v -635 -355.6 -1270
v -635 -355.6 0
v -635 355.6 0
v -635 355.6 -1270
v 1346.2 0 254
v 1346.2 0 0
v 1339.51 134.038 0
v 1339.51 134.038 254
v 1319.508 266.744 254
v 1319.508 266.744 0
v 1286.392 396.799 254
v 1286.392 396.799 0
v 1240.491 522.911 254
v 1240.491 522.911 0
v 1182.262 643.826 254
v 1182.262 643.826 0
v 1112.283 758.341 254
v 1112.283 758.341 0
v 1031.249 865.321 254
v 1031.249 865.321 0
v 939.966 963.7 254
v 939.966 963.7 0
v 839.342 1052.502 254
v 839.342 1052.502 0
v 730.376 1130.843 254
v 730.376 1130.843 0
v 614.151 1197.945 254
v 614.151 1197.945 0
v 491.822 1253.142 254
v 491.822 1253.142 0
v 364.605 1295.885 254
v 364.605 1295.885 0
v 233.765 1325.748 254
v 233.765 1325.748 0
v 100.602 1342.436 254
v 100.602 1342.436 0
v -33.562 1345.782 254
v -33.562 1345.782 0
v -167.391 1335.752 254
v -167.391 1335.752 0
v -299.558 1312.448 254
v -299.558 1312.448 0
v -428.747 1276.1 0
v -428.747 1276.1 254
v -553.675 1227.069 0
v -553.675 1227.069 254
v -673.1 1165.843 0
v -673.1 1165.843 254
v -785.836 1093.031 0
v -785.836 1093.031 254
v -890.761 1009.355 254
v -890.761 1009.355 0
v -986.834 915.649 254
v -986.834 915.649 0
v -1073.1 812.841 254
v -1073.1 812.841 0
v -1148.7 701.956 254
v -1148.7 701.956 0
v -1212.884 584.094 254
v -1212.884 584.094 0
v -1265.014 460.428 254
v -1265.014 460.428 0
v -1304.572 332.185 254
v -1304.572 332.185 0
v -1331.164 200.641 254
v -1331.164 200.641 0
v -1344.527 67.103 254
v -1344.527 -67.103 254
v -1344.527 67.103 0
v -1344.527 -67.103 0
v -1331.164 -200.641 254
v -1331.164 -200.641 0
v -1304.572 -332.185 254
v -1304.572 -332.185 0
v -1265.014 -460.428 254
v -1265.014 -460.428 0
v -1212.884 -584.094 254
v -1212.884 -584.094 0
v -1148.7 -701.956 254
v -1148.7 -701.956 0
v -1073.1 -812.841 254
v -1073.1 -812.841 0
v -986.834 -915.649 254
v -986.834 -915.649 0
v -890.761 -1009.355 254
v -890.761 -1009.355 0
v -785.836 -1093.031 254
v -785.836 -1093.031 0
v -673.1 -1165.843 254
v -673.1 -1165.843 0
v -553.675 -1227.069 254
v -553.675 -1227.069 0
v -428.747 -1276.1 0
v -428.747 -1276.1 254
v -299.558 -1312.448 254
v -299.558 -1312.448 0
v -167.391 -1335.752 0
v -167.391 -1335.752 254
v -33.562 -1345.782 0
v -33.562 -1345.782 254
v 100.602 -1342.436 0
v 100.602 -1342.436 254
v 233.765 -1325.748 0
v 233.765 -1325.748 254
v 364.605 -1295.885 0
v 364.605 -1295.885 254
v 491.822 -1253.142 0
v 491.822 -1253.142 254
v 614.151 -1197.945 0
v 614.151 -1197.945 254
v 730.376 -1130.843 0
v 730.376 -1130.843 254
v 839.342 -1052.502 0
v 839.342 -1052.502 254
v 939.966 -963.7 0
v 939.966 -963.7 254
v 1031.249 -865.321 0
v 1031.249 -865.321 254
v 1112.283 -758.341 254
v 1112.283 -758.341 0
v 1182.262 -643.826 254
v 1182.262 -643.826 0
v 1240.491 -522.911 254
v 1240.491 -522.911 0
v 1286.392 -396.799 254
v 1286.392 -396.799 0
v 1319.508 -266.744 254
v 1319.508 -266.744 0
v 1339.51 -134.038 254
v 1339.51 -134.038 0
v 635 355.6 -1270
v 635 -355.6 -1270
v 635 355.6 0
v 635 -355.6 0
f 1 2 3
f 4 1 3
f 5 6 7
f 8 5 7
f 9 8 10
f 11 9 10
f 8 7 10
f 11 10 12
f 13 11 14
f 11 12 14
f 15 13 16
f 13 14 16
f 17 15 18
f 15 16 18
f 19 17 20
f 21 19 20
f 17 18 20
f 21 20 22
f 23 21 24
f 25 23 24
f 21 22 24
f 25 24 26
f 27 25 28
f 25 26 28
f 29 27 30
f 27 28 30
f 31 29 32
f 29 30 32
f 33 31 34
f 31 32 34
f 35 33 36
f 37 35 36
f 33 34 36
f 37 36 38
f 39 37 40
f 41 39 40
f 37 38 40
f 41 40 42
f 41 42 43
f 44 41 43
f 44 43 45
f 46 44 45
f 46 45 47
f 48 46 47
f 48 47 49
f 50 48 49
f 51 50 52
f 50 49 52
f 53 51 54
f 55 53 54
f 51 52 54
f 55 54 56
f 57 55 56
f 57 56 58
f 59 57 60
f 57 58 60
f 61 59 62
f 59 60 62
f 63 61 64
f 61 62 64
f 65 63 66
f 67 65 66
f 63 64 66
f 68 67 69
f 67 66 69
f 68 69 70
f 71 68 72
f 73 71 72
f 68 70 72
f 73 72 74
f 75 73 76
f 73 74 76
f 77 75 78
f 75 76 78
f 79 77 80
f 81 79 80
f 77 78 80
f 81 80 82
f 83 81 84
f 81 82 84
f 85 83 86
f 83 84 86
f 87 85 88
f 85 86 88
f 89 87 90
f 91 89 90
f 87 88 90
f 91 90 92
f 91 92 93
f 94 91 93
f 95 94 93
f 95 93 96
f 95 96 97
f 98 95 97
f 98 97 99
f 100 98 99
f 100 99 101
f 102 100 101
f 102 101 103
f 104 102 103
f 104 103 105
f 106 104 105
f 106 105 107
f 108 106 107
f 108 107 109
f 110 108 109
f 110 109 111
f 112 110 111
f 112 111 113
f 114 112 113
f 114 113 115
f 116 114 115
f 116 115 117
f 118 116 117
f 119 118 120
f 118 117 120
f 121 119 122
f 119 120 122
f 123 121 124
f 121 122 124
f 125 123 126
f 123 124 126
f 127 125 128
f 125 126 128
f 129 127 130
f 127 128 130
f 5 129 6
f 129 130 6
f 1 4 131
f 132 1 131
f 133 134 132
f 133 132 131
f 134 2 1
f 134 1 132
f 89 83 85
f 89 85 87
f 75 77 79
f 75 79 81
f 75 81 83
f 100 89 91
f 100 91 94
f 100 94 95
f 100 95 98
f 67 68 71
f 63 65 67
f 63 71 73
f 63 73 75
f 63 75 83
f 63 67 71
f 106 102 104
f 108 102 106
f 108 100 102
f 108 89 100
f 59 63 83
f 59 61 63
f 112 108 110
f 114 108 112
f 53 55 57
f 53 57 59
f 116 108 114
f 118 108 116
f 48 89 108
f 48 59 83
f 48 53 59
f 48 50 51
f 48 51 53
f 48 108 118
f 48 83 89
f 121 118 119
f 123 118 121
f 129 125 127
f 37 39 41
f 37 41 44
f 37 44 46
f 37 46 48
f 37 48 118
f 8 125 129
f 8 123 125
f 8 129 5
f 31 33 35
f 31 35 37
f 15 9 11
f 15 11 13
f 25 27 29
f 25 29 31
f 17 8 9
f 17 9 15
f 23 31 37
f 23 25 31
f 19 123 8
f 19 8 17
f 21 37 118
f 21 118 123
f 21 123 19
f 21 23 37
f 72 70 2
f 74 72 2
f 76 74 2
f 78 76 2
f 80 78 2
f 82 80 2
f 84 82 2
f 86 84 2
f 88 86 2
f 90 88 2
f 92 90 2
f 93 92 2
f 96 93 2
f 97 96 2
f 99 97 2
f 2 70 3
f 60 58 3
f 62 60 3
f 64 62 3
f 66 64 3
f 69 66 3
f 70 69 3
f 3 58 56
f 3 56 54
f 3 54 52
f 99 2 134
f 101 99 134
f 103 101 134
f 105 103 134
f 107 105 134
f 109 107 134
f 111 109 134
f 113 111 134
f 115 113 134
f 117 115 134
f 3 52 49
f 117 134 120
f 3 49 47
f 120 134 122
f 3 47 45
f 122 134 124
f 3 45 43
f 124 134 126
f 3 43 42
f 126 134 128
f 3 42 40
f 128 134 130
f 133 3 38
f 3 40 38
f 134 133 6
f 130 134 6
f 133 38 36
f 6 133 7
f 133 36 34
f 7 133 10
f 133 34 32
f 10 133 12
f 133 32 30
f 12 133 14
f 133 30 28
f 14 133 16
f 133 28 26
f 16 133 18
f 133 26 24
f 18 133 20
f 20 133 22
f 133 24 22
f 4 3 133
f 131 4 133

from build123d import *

# Parameters (mm, degrees)
SKETCH1_R           = 1346.2
BOSS_EXTRUDE3_DEPTH = 254
SKETCH2_W           = 1270
SKETCH2_H           = 711.2
BOSS_EXTRUDE6_DEPTH = 1270


with BuildPart() as part:
    # Sketch1 → Boss-Extrude3 (new body)
    with BuildSketch(Plane.XY):
        Circle(SKETCH1_R)
    extrude(amount=BOSS_EXTRUDE3_DEPTH)

    # Sketch2 → Boss-Extrude6 (add)
    with BuildSketch(Plane.XY):
        Rectangle(SKETCH2_W, SKETCH2_H)
    extrude(amount=-BOSS_EXTRUDE6_DEPTH)


solid = part.part
